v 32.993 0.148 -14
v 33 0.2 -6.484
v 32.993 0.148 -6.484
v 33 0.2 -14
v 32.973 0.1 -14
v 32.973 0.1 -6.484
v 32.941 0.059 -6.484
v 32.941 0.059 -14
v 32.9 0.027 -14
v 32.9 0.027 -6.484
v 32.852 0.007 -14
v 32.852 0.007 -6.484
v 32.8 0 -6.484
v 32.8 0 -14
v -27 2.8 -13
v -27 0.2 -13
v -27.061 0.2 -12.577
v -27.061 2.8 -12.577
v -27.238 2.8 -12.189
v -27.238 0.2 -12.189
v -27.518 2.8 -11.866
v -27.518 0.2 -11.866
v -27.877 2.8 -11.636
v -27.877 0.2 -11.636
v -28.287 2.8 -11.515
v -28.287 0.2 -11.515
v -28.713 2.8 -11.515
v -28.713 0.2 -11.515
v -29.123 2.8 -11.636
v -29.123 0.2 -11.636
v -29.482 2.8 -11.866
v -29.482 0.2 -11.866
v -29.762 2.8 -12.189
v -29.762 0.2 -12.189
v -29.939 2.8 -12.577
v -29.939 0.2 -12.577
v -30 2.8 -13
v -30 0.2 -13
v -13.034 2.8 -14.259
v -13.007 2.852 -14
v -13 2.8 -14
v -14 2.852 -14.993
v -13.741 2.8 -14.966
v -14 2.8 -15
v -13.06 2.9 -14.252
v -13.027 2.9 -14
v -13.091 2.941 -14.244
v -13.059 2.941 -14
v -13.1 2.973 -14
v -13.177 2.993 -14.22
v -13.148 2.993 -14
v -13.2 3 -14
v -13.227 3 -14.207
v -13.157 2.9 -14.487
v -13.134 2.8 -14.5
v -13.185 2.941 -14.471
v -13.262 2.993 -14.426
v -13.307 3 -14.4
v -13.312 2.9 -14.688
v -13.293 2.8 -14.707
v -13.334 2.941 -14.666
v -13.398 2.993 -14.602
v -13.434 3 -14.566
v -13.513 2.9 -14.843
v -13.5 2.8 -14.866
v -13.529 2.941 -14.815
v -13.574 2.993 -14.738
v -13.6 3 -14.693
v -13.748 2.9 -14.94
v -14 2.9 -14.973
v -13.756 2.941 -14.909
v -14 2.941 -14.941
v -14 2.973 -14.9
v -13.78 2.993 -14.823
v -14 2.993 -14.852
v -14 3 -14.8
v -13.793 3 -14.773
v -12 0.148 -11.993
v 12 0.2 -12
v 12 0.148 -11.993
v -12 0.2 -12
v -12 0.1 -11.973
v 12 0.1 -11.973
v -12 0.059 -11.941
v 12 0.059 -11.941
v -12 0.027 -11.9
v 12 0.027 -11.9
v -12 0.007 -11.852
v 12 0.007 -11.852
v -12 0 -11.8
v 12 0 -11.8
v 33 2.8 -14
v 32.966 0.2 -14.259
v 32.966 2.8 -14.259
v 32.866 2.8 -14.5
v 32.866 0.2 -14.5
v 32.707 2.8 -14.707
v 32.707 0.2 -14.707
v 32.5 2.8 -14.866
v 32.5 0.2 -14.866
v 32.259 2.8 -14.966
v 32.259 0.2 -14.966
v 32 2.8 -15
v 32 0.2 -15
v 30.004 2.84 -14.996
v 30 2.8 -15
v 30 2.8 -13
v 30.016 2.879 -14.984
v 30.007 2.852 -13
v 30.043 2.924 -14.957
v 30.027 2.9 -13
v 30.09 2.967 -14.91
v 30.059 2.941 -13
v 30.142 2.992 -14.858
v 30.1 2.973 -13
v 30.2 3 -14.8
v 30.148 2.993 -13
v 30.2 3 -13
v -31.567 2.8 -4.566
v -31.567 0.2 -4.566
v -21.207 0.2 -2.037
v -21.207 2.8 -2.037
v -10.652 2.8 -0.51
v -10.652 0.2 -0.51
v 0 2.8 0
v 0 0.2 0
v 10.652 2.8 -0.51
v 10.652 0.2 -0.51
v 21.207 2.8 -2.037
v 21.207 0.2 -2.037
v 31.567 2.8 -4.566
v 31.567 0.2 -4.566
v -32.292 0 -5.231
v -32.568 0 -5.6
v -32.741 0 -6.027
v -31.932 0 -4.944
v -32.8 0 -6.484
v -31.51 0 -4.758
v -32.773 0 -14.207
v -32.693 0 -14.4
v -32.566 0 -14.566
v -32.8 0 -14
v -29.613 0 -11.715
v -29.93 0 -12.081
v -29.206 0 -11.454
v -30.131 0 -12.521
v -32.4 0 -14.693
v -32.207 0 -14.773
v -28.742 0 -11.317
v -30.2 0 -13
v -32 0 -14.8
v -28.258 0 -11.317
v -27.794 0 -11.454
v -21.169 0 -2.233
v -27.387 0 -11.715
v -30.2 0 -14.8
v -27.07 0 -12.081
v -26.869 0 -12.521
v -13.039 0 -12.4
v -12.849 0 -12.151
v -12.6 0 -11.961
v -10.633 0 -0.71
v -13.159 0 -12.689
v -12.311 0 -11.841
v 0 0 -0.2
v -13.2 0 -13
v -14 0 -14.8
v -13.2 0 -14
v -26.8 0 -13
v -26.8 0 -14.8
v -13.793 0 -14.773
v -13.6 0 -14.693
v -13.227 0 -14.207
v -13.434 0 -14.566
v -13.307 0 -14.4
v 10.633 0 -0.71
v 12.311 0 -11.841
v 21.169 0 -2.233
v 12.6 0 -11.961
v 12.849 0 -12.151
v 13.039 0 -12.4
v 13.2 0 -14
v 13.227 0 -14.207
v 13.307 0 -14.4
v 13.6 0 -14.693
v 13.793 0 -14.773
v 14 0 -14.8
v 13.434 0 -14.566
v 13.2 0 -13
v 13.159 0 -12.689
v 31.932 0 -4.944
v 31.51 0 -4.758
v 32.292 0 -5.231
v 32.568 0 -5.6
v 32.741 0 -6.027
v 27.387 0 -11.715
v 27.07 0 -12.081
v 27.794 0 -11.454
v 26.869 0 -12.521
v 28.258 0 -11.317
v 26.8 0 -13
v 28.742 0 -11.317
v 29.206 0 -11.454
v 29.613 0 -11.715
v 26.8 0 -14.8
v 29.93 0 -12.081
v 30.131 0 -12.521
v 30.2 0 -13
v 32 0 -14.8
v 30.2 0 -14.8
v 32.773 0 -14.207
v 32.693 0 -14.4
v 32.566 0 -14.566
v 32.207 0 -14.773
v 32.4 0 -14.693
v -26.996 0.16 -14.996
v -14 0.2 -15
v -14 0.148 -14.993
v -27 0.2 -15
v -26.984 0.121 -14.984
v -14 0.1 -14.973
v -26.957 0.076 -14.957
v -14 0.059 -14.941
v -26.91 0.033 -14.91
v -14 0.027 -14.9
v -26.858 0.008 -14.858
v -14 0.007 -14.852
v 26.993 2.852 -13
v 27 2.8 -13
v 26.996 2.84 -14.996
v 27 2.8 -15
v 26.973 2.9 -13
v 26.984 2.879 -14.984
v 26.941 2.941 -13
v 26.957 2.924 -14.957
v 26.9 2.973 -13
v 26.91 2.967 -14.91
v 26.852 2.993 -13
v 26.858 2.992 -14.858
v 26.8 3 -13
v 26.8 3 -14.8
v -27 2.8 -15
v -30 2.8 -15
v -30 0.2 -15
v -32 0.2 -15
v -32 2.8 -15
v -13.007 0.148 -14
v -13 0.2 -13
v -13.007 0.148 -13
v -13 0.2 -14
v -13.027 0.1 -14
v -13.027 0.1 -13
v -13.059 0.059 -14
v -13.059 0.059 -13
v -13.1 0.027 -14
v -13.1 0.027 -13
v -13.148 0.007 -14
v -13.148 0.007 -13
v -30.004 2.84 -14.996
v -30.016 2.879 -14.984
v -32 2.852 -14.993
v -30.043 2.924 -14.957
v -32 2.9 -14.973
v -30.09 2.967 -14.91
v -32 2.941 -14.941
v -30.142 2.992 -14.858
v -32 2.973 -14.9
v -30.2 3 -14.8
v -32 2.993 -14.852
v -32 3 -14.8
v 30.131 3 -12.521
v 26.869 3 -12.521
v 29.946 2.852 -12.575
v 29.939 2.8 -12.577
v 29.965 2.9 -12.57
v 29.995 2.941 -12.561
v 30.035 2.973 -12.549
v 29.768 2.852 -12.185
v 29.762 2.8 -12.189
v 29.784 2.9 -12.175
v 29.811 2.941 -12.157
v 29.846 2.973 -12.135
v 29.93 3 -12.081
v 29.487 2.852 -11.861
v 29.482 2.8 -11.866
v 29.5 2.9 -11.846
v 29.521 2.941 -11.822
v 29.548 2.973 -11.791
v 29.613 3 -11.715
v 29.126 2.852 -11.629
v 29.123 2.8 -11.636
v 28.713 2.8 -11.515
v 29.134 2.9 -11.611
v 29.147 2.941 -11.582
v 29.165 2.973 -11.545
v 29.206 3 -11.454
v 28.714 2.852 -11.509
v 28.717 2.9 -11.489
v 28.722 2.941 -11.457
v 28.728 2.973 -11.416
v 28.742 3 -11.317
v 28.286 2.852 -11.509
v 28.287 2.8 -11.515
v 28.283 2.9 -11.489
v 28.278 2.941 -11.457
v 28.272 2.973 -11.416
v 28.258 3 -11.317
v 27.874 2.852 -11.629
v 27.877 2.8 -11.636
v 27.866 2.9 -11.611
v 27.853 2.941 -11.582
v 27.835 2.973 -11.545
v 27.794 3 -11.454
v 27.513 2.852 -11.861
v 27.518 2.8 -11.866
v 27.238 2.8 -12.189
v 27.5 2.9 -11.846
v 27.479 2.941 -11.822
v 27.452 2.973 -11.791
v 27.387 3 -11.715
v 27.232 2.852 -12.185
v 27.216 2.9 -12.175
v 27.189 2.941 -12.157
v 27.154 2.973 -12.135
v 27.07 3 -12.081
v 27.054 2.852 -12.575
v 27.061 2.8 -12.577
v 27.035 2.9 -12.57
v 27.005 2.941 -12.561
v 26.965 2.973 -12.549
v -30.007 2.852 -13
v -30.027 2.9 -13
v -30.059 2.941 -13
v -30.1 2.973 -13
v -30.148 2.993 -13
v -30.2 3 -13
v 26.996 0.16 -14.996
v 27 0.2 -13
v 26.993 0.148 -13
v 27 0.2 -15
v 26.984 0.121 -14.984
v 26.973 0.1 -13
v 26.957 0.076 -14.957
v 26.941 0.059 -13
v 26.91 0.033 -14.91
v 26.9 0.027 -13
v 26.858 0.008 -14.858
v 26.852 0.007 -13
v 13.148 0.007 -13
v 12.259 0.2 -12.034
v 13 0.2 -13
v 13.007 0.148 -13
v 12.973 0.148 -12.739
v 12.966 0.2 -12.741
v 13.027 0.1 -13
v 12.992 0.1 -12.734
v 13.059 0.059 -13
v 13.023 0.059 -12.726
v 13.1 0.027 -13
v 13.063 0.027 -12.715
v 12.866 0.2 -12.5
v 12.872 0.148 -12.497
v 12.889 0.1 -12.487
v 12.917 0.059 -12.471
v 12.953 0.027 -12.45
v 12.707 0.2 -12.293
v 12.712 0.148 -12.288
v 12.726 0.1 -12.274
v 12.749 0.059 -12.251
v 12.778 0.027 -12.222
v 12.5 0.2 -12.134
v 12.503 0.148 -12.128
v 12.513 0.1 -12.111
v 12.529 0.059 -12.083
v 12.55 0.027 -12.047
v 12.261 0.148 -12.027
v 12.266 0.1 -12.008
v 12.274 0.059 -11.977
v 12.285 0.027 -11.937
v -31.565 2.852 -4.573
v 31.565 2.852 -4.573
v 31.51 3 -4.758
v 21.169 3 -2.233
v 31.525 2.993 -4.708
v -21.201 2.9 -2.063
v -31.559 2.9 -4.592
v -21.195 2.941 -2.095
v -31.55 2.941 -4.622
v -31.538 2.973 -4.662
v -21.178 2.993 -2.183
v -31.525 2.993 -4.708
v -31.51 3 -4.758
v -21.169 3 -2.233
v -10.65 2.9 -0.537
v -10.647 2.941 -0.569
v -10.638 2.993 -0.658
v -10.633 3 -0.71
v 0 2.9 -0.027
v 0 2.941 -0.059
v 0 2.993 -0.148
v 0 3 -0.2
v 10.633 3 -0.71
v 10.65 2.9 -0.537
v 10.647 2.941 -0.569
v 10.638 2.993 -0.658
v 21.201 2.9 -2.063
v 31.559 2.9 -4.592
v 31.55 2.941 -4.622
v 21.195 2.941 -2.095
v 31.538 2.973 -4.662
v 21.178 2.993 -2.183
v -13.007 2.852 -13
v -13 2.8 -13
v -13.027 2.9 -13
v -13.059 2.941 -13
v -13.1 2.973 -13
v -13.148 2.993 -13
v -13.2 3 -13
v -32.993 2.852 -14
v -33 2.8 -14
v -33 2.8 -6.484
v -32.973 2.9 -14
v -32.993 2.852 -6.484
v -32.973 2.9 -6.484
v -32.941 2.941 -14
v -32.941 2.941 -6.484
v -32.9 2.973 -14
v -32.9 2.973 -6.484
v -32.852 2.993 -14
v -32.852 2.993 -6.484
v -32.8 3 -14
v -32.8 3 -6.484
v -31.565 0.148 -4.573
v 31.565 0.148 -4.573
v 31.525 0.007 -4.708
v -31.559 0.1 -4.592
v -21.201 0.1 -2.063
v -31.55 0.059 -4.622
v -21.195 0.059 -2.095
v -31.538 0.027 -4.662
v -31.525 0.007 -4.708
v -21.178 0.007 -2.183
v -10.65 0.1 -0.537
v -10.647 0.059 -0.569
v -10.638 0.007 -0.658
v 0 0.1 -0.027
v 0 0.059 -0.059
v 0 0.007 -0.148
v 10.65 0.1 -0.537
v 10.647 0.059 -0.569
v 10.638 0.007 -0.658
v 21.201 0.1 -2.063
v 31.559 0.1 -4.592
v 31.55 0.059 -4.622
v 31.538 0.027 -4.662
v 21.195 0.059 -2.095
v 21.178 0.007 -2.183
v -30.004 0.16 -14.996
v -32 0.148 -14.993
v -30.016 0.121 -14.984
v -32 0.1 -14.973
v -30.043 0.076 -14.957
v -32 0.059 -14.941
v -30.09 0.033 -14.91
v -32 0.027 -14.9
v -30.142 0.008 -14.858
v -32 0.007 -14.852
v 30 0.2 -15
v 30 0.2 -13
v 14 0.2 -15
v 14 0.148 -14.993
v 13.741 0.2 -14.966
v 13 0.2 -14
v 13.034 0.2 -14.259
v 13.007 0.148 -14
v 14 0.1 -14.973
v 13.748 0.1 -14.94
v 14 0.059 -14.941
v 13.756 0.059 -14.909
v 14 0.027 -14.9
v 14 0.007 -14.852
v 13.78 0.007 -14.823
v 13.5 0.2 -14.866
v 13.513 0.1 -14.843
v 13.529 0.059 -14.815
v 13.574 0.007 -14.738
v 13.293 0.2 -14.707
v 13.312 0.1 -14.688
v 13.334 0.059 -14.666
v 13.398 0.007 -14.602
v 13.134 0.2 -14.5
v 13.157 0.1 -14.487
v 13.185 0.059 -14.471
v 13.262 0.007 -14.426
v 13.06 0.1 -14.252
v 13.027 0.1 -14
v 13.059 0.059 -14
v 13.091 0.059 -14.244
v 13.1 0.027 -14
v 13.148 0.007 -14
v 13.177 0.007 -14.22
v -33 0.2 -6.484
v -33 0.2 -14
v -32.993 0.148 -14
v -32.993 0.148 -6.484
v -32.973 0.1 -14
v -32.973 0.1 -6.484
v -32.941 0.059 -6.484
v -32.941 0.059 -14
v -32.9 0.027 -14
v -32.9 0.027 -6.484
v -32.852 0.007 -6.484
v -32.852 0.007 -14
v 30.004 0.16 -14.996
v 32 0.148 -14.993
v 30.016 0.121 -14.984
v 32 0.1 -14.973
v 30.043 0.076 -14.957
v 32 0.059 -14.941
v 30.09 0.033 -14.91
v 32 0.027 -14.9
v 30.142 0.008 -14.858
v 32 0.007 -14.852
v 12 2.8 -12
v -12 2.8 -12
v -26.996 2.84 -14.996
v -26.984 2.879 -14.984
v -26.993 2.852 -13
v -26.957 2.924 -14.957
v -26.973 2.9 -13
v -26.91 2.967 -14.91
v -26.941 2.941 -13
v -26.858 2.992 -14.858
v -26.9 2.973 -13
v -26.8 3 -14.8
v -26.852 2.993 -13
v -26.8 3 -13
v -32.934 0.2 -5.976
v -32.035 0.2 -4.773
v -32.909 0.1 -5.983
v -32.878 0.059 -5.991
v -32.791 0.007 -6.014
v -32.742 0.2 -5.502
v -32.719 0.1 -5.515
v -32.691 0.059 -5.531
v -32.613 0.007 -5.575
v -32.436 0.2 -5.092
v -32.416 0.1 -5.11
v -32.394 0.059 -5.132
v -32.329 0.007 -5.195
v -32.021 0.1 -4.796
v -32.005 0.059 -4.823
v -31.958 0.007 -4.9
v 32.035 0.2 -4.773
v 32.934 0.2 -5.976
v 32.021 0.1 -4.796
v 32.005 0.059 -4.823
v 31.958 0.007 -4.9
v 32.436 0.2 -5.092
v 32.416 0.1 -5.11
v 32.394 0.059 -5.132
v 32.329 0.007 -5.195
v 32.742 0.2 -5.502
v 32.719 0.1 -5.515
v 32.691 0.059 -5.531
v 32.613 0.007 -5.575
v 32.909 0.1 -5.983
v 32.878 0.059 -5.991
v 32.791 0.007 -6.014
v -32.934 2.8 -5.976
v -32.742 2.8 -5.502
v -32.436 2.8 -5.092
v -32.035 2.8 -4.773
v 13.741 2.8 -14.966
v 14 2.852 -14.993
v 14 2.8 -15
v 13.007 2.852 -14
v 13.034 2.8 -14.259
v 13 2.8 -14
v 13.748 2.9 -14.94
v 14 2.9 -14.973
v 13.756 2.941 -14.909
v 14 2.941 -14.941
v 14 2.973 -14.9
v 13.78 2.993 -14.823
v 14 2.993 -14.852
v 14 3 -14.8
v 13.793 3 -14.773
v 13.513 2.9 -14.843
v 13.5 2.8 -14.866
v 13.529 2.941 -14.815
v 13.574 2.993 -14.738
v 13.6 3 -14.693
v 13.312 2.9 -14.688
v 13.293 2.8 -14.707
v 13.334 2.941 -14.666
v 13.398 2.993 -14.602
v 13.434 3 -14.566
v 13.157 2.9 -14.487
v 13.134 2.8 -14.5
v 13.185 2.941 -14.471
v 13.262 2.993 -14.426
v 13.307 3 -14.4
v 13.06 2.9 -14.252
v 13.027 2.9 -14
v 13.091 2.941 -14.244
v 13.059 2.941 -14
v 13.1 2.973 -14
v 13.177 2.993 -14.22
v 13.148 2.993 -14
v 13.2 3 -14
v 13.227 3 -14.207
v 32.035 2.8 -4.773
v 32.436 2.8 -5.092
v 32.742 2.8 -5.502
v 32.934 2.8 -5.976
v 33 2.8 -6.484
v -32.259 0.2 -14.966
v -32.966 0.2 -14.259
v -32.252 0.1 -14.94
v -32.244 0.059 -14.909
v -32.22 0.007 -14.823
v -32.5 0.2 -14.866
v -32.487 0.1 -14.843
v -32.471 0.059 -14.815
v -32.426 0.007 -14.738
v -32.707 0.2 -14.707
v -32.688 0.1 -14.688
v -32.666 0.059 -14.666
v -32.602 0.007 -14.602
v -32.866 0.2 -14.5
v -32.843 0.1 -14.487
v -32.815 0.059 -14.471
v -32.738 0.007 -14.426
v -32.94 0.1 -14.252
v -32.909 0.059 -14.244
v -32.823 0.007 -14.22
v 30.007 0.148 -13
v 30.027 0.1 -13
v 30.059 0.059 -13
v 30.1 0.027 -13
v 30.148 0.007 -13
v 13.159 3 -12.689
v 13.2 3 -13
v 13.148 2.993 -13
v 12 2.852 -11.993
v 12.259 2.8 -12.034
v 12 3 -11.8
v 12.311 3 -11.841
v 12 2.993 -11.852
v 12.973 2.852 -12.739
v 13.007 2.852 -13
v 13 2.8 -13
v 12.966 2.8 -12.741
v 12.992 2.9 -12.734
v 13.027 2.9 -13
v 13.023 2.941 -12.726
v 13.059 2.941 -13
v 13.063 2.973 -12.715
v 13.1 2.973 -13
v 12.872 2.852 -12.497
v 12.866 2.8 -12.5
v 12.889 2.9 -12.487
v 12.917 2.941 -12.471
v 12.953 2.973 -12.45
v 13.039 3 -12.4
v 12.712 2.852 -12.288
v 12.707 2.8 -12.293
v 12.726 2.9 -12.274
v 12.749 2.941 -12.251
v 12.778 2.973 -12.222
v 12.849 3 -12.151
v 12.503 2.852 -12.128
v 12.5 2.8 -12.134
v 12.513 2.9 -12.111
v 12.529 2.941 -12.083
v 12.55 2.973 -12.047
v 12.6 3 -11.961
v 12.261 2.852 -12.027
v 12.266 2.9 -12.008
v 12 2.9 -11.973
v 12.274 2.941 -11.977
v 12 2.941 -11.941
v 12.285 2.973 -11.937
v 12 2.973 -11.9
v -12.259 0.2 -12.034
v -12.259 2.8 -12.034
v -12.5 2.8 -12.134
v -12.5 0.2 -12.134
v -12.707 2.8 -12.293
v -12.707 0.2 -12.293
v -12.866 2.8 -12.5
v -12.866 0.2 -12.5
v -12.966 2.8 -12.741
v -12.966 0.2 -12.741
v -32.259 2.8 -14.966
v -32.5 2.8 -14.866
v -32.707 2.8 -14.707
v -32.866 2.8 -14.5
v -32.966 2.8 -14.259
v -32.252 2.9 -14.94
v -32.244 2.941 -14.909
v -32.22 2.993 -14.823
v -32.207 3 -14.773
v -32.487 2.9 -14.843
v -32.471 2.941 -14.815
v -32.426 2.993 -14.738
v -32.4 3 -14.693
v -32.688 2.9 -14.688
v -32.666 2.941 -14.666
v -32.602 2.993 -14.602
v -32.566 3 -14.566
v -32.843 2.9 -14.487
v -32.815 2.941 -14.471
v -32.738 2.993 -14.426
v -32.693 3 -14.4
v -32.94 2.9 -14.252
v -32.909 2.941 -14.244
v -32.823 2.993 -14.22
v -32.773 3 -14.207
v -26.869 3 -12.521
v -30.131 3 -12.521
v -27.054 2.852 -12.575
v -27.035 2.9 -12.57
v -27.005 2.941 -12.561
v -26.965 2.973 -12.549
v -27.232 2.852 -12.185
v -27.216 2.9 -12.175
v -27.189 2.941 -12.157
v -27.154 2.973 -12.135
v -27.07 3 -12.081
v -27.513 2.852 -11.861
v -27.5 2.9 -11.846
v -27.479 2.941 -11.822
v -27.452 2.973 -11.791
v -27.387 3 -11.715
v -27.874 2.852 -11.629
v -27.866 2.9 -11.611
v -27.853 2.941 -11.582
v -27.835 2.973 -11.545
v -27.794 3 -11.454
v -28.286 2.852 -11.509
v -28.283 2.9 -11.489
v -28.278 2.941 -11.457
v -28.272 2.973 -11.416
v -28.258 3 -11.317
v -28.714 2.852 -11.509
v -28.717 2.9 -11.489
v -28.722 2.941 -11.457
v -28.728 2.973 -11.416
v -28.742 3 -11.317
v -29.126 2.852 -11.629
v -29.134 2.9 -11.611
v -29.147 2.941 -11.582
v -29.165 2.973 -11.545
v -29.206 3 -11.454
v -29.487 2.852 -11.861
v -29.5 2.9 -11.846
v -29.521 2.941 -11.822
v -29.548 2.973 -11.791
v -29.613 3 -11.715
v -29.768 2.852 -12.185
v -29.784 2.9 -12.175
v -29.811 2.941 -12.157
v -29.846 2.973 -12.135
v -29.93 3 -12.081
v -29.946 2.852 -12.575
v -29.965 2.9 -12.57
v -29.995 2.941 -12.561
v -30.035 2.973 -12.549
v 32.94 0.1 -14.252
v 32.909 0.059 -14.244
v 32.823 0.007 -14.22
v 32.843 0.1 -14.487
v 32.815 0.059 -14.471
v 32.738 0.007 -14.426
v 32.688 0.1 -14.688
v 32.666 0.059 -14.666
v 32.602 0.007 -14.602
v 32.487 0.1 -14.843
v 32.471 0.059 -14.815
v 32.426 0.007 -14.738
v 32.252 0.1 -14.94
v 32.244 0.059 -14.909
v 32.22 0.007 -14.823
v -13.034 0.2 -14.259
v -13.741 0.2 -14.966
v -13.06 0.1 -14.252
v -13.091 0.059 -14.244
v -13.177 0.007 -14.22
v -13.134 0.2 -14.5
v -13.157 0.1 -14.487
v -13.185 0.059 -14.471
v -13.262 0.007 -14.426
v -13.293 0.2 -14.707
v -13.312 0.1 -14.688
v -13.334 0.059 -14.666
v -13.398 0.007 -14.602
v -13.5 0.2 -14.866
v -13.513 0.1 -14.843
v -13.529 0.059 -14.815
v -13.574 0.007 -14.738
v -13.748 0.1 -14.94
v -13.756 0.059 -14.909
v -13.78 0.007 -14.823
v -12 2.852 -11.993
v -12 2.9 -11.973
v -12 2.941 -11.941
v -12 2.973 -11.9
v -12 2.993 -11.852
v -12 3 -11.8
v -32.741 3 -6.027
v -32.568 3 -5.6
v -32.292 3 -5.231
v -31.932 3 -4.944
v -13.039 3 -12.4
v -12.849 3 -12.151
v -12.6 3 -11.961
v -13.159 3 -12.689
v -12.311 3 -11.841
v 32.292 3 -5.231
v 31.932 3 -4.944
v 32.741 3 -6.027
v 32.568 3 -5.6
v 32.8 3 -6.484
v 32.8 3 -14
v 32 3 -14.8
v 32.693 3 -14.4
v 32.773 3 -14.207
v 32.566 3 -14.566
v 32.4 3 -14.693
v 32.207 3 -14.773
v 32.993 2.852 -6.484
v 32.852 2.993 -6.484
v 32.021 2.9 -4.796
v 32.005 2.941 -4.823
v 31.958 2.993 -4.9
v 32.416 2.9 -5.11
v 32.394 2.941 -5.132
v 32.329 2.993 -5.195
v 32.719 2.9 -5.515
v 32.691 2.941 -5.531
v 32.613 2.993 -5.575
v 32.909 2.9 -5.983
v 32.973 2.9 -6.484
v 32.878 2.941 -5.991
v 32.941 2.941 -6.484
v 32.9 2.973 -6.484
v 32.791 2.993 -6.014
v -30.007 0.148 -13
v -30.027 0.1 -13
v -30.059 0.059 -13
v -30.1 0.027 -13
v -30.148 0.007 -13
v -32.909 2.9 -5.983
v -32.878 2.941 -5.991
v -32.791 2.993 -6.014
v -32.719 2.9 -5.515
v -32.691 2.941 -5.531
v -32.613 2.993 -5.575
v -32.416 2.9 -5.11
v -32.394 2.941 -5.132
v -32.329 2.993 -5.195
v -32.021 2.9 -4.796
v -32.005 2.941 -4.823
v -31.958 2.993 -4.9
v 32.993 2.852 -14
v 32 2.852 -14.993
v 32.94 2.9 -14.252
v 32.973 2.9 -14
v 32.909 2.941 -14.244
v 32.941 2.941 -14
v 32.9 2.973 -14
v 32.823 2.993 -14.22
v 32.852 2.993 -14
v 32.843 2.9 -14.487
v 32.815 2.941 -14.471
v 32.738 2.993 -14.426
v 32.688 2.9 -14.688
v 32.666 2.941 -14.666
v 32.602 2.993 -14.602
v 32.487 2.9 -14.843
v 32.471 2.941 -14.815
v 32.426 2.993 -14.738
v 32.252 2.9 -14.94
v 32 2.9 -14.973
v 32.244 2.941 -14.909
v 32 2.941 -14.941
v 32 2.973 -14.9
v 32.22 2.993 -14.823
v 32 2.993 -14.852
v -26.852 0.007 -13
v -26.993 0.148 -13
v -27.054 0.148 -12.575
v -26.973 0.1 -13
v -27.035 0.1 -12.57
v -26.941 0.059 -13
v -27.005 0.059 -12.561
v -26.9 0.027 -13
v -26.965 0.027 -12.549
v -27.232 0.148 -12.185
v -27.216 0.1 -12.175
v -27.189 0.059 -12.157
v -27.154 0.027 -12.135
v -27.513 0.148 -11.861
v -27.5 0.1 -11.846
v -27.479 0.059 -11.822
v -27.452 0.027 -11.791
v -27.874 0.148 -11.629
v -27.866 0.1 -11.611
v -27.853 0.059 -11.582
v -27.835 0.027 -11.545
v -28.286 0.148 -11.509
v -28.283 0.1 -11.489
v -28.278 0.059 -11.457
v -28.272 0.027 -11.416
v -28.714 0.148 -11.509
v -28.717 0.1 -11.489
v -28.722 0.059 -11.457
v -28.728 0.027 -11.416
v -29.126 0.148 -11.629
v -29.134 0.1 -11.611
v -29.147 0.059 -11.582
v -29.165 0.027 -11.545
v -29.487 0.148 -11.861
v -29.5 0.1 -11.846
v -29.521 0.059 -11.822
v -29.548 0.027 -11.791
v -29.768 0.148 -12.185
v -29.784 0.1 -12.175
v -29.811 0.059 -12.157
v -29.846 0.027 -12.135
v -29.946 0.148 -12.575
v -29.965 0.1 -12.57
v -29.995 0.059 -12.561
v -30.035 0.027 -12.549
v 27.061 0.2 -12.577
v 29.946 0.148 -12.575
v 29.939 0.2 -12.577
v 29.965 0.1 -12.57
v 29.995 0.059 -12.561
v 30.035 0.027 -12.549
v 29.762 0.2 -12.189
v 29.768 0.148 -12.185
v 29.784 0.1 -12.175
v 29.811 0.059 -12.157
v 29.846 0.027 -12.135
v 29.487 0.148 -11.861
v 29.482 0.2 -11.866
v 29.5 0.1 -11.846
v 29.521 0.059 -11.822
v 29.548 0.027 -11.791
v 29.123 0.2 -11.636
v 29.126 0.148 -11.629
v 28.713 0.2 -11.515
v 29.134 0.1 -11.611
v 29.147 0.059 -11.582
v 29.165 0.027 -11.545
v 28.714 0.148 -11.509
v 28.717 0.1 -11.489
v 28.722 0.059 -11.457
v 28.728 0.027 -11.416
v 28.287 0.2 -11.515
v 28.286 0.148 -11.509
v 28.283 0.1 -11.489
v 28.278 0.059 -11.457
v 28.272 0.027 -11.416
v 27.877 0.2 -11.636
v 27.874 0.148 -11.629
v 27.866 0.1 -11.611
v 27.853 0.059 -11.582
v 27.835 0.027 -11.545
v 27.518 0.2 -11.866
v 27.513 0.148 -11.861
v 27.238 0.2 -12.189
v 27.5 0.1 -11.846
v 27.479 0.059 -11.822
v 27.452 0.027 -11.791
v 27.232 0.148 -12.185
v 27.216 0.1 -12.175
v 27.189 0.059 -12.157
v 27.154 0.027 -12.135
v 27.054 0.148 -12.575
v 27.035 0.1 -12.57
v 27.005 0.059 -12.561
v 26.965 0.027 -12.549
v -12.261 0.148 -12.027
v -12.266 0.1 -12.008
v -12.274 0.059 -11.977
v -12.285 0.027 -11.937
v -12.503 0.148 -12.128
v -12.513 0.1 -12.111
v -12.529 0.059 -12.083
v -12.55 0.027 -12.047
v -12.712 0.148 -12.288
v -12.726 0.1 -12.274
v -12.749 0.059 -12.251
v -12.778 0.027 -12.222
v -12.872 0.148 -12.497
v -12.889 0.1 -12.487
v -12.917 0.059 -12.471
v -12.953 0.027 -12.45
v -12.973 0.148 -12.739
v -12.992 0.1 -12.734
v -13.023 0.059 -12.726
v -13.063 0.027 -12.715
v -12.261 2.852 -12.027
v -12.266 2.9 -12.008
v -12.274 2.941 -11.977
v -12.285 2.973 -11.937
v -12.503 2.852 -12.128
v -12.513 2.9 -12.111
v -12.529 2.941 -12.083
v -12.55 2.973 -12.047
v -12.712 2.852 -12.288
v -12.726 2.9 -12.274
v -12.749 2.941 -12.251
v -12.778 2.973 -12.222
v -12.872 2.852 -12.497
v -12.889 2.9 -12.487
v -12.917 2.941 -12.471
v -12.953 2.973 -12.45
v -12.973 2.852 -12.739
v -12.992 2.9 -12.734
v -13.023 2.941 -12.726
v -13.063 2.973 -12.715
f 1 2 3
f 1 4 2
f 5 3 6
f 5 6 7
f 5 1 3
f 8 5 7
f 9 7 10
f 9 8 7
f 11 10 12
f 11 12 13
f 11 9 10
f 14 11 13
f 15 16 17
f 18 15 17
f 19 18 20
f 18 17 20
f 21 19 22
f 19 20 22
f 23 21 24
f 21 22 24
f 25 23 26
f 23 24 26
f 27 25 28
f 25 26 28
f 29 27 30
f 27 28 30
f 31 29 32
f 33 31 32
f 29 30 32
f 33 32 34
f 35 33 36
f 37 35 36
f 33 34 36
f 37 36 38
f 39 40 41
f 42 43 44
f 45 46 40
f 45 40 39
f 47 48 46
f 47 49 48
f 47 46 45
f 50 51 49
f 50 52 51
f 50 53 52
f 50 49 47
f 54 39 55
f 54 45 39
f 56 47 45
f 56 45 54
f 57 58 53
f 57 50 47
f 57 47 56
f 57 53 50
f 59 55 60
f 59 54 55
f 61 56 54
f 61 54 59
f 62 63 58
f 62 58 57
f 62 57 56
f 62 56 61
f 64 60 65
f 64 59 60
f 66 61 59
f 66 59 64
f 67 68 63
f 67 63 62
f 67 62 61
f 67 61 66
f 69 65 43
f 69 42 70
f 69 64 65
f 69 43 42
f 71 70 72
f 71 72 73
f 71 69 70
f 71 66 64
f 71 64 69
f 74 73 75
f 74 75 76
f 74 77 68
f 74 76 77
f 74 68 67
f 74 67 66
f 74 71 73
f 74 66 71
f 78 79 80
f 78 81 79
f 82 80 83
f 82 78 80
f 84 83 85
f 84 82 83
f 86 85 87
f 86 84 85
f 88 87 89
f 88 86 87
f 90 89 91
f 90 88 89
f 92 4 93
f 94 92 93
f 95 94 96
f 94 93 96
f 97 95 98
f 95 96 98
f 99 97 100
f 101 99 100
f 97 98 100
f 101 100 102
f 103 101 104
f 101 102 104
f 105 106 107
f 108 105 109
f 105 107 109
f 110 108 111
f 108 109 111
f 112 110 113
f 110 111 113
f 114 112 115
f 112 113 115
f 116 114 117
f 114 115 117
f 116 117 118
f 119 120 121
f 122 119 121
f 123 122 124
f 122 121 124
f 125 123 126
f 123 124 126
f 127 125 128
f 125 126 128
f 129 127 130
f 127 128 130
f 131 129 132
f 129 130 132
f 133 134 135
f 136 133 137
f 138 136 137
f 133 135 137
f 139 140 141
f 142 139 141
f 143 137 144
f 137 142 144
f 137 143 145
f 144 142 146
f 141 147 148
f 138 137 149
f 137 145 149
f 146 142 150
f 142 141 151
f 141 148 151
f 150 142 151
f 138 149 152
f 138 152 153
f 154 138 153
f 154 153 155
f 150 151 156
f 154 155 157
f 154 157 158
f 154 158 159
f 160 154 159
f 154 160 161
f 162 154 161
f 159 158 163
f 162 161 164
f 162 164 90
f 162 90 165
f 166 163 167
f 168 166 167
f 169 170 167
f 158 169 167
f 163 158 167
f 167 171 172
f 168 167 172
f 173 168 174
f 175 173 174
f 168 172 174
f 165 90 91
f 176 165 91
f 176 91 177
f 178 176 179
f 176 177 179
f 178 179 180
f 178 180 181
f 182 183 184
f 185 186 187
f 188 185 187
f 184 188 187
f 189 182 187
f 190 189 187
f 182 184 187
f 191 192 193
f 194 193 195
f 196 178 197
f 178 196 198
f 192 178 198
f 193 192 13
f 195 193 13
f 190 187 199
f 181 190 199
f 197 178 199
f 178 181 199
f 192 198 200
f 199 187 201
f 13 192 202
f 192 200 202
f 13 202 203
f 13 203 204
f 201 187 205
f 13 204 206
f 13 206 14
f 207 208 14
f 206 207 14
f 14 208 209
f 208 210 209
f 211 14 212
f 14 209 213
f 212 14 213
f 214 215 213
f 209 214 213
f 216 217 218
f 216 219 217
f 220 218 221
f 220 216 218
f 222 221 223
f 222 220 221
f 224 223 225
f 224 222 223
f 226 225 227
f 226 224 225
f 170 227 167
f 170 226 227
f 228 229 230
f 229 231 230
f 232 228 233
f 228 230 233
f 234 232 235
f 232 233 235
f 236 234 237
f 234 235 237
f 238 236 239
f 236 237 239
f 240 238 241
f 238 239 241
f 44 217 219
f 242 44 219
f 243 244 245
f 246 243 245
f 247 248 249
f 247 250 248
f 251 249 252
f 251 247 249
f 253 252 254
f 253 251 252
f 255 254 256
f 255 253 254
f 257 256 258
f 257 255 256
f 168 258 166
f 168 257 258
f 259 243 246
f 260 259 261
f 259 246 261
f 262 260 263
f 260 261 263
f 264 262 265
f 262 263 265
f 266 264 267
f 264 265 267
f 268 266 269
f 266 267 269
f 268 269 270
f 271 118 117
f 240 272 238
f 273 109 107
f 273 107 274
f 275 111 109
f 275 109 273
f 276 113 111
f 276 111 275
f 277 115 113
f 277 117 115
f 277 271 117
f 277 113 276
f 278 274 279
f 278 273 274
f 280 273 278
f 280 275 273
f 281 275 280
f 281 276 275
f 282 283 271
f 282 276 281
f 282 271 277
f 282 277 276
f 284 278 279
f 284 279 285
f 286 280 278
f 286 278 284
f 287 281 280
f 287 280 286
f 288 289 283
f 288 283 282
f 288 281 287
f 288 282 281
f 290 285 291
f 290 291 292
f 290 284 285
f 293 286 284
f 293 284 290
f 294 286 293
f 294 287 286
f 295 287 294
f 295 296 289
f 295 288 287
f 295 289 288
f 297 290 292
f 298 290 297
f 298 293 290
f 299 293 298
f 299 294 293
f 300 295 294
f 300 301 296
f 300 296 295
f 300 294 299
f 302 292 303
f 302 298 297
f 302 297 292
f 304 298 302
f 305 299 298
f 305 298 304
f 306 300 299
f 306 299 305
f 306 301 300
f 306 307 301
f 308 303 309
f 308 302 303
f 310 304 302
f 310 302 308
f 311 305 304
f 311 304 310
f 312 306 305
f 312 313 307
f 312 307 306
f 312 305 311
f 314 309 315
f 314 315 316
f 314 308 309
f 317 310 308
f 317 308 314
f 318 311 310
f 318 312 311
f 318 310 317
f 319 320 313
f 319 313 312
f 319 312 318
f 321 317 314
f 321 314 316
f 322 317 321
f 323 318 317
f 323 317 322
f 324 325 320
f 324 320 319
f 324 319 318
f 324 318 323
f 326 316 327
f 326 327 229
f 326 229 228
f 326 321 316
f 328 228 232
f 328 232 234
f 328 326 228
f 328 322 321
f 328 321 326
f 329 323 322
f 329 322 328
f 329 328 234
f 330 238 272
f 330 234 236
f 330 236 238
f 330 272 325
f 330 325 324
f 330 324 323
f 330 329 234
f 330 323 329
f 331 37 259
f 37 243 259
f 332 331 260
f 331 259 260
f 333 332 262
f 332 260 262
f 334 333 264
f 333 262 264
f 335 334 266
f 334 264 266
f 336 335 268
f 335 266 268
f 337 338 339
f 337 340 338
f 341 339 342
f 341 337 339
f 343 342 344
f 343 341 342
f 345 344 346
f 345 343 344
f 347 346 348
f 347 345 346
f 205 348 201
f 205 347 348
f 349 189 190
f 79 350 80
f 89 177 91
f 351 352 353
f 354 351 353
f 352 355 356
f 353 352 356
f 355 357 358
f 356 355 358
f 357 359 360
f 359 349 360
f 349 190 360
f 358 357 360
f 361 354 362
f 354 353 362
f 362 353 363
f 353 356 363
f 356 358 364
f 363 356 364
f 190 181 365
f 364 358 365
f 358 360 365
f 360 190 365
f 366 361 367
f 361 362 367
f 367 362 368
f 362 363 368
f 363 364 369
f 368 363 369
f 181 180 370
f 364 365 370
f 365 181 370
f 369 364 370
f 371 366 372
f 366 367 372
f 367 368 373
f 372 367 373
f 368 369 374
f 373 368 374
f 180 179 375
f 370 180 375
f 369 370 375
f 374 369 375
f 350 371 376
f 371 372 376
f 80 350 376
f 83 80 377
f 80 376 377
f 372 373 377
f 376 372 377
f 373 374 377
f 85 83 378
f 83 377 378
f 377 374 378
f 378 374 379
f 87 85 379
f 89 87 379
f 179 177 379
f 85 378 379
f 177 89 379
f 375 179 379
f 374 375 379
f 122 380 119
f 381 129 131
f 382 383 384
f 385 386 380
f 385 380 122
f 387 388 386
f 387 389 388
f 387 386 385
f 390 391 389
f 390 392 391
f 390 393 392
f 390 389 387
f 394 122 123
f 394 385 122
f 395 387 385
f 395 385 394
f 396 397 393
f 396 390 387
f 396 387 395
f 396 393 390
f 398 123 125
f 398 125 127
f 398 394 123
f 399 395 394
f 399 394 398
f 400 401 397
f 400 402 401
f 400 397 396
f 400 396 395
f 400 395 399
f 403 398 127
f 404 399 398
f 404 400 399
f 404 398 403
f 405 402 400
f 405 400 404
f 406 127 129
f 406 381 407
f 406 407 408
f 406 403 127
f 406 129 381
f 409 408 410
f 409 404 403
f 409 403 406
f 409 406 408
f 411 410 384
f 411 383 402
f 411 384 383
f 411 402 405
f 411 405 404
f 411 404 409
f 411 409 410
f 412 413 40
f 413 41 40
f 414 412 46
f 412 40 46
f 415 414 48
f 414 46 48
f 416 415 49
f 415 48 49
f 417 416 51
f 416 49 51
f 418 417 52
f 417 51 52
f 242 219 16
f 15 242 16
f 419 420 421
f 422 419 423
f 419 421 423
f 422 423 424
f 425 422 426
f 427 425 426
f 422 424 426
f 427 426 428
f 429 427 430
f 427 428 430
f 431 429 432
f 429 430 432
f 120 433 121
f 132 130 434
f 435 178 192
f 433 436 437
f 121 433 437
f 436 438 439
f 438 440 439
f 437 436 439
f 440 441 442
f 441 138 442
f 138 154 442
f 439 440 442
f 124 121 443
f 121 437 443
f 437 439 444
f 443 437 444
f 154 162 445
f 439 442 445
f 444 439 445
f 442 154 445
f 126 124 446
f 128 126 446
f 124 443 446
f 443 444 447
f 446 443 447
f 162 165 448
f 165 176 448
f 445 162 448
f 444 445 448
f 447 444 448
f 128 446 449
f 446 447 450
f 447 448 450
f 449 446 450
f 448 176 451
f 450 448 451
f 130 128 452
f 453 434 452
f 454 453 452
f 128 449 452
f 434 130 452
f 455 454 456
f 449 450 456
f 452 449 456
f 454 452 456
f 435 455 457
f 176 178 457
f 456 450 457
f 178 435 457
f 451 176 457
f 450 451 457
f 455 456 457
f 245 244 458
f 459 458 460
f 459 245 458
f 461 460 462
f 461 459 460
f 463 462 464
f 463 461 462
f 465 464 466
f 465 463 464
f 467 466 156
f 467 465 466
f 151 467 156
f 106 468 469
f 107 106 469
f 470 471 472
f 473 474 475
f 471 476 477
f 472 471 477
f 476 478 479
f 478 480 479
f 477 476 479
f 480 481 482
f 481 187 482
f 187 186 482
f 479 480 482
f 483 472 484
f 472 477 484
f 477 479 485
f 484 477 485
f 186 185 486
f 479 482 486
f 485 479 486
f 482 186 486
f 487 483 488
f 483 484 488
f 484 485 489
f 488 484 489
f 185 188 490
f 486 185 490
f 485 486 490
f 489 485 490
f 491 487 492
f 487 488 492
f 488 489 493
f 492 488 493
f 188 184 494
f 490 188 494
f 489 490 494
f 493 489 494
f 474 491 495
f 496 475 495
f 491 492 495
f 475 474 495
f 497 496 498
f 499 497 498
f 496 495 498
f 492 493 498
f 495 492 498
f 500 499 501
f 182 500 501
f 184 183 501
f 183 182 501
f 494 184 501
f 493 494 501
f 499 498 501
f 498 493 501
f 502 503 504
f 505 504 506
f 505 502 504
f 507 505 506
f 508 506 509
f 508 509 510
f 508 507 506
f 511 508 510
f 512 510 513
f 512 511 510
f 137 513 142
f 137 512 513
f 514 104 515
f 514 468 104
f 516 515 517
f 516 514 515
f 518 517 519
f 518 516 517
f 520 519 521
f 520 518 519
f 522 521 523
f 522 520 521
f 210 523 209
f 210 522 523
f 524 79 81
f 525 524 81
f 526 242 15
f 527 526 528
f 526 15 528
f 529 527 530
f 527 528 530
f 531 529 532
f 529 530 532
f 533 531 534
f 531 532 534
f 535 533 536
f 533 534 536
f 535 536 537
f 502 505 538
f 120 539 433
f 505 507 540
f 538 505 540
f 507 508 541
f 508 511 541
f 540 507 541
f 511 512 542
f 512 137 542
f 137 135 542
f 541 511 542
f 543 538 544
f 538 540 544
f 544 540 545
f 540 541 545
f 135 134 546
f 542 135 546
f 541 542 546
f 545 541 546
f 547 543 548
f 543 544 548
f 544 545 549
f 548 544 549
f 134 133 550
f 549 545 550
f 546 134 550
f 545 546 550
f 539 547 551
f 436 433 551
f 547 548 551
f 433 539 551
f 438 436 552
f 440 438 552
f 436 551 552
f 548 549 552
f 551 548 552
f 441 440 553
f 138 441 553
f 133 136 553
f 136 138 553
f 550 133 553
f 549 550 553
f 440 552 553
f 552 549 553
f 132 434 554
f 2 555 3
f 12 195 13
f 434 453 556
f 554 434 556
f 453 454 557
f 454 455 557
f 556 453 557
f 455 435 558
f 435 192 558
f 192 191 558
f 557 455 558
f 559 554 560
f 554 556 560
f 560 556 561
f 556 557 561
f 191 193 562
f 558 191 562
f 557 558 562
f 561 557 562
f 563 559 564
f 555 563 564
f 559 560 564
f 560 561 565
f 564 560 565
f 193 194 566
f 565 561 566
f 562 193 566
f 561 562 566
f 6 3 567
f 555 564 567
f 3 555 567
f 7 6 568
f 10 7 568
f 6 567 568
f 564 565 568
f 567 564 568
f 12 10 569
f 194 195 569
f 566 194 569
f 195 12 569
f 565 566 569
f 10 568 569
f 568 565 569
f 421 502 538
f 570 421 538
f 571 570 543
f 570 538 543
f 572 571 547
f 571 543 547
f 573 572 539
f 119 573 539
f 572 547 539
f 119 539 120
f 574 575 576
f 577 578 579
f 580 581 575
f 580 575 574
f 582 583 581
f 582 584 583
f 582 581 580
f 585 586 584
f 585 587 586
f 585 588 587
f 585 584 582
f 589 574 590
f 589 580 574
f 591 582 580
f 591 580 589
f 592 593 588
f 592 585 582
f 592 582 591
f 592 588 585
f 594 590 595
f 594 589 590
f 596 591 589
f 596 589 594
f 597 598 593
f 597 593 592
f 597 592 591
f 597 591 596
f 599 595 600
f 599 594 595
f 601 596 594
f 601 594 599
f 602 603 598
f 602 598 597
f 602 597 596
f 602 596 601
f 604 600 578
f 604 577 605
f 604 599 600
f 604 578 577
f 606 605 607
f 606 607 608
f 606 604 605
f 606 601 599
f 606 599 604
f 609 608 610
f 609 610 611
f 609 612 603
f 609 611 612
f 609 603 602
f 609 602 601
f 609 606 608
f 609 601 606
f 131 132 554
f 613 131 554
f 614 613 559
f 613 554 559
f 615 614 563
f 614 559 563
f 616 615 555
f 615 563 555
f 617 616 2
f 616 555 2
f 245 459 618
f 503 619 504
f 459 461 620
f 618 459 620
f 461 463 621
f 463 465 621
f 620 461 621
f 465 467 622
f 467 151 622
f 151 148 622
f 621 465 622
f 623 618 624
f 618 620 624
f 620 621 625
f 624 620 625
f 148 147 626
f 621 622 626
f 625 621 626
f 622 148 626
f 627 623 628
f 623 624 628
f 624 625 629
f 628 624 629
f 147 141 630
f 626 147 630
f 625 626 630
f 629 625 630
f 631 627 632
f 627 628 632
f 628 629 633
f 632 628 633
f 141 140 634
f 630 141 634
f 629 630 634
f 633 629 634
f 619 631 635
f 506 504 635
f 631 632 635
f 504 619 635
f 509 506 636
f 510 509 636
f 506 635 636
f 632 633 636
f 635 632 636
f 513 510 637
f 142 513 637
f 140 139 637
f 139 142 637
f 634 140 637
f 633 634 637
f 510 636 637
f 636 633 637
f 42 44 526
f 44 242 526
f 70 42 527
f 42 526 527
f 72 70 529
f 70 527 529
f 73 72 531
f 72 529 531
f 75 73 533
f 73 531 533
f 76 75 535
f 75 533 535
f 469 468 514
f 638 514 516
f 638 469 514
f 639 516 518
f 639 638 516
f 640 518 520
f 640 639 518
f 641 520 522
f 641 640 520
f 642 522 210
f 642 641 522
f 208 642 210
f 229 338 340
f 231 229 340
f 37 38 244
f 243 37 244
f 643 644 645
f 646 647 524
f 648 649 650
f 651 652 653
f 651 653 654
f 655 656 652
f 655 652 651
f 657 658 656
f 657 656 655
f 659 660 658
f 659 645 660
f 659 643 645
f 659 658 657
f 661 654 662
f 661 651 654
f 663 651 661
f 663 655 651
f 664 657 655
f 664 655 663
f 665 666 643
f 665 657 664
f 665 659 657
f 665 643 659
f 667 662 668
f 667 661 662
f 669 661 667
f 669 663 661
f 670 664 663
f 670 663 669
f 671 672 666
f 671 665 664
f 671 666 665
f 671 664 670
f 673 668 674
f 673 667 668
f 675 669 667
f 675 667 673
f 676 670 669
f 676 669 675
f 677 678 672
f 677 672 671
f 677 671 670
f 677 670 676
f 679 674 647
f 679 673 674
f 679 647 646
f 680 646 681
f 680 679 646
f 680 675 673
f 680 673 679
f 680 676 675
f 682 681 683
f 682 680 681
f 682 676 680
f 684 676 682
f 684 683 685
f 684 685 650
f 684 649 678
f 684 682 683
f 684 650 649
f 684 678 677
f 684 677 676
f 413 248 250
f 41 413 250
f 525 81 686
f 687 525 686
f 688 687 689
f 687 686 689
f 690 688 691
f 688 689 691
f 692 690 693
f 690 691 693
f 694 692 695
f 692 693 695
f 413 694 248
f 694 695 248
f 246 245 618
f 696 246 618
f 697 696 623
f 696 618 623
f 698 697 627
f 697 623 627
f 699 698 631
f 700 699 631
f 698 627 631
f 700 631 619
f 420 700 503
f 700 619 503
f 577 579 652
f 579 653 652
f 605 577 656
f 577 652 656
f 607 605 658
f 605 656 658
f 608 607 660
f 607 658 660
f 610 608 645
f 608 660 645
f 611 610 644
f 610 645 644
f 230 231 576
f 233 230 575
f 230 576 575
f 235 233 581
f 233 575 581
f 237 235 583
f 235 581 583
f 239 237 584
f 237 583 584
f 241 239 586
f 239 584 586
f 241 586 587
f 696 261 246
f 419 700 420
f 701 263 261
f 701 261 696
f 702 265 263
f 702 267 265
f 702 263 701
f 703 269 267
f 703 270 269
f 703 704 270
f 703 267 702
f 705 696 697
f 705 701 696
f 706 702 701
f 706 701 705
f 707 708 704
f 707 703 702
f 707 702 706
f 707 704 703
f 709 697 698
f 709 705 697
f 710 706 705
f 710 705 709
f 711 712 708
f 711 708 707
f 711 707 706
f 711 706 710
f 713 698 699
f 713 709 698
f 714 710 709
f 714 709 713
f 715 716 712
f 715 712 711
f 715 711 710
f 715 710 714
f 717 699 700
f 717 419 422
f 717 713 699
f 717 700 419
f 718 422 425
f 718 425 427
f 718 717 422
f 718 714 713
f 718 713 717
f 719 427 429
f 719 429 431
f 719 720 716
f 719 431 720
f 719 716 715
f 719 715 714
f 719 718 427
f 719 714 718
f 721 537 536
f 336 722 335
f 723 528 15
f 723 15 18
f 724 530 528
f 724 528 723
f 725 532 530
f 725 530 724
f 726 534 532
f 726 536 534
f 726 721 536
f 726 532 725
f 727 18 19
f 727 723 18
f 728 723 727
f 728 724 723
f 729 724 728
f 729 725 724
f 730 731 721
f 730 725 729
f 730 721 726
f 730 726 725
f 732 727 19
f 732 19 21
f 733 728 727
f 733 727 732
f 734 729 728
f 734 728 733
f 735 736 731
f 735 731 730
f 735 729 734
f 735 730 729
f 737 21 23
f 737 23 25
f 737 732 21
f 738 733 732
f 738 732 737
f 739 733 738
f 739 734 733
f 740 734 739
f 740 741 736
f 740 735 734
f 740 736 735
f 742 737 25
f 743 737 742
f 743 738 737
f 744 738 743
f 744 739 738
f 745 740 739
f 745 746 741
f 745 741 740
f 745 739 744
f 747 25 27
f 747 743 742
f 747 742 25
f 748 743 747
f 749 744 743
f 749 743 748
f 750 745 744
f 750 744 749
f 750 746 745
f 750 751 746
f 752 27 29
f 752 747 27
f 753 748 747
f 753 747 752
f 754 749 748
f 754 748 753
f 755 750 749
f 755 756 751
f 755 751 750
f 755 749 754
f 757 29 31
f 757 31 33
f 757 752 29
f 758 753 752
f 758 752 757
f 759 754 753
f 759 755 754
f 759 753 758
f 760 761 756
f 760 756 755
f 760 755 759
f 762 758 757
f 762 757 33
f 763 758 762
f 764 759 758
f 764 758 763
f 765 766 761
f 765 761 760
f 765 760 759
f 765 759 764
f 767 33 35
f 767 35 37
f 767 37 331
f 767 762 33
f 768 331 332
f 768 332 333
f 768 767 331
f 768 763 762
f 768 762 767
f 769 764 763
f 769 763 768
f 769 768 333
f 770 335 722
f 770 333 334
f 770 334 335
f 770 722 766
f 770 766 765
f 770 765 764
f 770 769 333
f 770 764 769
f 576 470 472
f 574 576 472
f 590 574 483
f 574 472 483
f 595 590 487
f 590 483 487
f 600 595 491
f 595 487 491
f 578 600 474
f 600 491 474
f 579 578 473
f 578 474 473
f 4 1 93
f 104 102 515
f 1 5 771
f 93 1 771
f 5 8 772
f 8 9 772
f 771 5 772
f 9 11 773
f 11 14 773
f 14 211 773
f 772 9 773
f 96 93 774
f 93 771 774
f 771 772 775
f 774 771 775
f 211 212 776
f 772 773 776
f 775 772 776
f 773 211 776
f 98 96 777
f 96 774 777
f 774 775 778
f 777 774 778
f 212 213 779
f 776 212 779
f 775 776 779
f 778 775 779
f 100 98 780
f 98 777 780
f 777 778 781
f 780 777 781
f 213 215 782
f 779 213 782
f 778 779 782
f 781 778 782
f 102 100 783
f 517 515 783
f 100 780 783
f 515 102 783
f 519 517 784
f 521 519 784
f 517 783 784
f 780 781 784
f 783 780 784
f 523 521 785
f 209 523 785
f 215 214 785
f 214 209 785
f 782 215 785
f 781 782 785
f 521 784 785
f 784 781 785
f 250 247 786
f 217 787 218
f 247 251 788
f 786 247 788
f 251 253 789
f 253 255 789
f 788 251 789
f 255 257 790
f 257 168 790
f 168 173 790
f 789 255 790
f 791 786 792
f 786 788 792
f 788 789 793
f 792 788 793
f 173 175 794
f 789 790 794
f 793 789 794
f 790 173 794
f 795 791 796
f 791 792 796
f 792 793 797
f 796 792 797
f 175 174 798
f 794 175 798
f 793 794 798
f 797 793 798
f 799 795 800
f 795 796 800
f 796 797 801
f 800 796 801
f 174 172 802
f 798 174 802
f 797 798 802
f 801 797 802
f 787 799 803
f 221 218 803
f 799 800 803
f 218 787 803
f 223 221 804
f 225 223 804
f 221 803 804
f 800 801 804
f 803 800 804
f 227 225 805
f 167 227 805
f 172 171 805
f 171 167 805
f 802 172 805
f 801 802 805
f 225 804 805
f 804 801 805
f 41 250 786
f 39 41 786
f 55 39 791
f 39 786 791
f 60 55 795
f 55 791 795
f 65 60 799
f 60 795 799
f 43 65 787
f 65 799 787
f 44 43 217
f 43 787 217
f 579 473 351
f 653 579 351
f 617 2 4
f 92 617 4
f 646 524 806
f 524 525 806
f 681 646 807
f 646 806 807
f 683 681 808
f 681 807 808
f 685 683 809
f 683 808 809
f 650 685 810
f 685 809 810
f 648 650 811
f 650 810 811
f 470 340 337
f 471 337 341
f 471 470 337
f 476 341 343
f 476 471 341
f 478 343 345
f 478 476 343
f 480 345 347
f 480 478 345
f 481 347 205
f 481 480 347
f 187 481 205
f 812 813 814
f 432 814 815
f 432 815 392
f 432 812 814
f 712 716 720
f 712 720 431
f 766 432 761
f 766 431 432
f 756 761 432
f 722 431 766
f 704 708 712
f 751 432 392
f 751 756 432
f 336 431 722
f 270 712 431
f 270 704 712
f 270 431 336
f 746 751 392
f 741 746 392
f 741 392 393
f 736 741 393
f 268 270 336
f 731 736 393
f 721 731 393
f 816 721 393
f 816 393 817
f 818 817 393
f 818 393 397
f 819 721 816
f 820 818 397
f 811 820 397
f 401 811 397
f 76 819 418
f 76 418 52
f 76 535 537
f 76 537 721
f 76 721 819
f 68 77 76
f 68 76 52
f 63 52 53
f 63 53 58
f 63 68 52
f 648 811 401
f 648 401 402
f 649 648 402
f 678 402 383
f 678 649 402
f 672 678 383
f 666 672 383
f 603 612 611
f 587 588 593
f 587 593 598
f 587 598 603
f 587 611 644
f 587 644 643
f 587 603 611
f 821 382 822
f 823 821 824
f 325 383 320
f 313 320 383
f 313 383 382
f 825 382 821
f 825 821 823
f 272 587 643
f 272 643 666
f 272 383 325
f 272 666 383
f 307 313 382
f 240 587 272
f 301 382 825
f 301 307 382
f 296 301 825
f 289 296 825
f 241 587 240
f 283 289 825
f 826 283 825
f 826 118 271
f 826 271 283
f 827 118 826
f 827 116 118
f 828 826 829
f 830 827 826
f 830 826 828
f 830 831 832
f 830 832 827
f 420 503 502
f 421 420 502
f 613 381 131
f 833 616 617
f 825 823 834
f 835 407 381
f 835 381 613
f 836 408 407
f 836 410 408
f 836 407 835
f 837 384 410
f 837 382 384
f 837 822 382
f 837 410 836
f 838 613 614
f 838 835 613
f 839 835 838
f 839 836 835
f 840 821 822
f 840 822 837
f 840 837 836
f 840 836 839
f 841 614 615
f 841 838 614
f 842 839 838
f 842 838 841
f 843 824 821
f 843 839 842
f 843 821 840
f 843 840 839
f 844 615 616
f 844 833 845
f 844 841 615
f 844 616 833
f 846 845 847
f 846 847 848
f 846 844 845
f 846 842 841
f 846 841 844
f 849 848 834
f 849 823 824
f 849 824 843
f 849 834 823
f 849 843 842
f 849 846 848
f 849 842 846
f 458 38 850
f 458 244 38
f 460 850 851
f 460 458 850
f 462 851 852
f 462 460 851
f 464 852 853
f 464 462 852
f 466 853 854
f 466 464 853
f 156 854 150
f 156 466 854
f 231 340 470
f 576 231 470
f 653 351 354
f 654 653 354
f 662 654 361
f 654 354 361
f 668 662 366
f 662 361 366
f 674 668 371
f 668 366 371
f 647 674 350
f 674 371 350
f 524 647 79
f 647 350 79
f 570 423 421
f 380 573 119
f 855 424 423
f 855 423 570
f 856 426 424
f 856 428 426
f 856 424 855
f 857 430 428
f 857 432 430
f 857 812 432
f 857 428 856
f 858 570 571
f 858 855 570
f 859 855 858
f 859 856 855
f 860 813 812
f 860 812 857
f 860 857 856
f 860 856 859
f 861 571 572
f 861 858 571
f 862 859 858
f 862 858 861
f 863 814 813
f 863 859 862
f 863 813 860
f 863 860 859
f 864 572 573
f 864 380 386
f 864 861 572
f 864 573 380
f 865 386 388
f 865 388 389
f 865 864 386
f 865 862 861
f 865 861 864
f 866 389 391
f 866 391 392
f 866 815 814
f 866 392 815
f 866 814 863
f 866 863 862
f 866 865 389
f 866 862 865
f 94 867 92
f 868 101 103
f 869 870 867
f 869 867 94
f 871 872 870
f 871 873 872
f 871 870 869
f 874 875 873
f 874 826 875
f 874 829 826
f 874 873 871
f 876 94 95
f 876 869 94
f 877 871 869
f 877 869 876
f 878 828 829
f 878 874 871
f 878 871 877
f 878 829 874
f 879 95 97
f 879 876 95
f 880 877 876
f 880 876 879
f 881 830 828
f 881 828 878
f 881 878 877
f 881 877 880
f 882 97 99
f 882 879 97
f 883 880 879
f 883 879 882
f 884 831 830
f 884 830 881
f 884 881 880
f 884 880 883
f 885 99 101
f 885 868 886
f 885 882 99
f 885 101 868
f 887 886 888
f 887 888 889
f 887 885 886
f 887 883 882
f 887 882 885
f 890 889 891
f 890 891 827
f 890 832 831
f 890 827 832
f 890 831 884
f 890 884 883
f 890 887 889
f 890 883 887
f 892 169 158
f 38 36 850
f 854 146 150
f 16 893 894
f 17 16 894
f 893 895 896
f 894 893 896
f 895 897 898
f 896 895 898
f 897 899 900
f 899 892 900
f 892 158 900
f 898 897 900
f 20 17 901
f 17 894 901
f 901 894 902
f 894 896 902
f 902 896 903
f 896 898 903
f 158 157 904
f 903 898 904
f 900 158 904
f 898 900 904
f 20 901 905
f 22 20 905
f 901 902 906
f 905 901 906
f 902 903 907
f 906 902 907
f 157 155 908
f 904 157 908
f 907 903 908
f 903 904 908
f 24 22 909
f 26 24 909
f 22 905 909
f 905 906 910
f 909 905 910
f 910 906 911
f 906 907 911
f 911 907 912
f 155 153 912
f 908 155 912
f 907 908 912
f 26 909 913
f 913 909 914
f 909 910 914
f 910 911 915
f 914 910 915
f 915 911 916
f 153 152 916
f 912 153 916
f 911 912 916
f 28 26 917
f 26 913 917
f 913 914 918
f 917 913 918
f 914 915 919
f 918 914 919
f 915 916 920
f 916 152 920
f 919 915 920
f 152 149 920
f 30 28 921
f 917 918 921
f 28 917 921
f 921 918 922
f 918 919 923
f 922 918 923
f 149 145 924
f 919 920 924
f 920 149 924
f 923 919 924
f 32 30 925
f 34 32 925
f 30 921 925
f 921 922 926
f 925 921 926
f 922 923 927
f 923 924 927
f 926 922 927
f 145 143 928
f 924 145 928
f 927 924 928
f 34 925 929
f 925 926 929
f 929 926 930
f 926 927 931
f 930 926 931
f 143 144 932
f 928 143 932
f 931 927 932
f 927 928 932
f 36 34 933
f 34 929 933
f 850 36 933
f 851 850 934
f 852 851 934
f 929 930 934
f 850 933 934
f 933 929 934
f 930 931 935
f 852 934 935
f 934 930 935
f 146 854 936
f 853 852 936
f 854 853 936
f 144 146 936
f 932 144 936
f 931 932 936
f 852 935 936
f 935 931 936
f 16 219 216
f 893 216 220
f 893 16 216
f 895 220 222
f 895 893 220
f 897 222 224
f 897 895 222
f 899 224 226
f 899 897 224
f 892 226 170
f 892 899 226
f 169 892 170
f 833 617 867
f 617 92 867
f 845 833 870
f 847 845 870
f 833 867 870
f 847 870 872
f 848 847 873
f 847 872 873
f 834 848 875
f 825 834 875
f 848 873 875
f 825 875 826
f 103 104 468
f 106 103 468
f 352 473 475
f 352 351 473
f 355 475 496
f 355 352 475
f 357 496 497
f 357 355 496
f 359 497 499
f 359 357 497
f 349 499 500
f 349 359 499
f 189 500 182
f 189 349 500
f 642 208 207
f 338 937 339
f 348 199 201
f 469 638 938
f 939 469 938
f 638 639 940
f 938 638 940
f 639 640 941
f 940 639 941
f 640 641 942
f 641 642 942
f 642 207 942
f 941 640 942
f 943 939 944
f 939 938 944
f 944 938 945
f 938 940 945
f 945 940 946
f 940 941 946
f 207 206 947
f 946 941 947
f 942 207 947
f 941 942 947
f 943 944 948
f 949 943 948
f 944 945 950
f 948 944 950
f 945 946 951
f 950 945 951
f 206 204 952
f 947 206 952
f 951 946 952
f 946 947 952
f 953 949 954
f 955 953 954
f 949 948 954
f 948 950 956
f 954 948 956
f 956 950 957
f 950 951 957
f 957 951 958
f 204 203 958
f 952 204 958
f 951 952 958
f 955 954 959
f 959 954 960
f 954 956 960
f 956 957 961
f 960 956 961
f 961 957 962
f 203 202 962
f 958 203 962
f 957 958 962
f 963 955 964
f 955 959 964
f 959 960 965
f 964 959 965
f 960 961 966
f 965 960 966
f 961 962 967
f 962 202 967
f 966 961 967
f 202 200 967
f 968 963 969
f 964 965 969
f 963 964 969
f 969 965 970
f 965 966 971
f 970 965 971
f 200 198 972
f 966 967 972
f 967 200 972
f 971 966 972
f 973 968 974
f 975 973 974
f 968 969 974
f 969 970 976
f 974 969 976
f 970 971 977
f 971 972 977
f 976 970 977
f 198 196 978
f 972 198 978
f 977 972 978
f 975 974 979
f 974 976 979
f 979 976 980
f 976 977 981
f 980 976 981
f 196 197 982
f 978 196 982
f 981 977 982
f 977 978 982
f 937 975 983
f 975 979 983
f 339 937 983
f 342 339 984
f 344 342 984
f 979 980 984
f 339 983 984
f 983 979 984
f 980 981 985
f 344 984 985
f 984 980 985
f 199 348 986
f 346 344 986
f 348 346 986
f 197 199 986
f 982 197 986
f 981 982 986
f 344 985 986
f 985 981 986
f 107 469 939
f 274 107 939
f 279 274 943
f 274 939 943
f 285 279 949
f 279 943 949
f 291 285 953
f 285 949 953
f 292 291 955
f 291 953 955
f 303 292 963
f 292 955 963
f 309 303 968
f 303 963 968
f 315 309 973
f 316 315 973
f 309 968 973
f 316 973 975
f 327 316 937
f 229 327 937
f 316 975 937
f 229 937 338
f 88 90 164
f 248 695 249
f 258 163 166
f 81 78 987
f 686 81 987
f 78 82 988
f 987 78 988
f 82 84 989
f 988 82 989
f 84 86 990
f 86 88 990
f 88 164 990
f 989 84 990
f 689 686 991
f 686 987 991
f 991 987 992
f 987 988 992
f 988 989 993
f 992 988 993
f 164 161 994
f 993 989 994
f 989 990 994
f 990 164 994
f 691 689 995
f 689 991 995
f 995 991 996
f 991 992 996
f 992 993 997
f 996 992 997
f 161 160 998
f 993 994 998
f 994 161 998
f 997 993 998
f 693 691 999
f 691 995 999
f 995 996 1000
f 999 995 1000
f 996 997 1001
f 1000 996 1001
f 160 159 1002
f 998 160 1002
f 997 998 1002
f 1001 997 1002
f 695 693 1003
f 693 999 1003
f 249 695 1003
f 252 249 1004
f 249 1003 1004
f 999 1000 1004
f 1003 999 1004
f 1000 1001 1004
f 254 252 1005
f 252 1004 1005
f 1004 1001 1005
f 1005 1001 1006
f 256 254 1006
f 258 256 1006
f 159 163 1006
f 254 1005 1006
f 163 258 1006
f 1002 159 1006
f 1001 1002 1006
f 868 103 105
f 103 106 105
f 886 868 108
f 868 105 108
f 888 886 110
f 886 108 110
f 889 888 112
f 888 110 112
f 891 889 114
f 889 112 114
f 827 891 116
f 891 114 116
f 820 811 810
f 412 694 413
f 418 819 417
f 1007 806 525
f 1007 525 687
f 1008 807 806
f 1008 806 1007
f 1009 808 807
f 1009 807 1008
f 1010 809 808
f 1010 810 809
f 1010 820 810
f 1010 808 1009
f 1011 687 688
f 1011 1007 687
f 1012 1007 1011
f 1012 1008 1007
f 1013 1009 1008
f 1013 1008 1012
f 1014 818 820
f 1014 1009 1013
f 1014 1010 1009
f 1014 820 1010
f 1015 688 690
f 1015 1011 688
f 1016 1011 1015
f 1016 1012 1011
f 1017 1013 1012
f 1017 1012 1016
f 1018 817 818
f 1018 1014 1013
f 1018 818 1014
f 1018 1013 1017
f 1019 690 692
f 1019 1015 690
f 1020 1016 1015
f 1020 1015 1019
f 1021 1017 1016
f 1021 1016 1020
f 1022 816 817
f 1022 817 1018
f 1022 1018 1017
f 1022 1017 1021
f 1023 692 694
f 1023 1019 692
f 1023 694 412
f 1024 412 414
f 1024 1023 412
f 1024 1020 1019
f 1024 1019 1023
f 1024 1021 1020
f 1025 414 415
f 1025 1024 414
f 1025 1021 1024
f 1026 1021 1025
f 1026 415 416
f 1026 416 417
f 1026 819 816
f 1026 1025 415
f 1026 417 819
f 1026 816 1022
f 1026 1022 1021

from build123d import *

# Parameters (mm, degrees)
BOSS_EXTRUDE1_DEPTH = 3
FILLET1_R           = 0.2


with BuildPart() as part:
    # Sketch1 → Boss-Extrude1 (new body)
    with BuildSketch(Plane(origin=(0, 0, 0), x_dir=(1, 0, 0), z_dir=(0, 1, 0))):
        with BuildLine():
            Line((-33, 14), (-33, 6.484033627))
            ThreePointArc((-33, 6.484033627), (-32.602100997, 5.286840077), (-31.566727605, 4.566008648))
            ThreePointArc((-31.566727605, 4.566008648), (0, 0), (31.566727605, 4.566008648))
            ThreePointArc((31.566727605, 4.566008648), (32.602100997, 5.286840077), (33, 6.484033627))
            Line((33, 6.484033627), (33, 14))
            ThreePointArc((33, 14), (32.707106781, 14.707106781), (32, 15))
            Line((32, 15), (30, 15))
            Line((30, 15), (30, 13))
            ThreePointArc((30, 13), (28.5, 11.5), (27, 13))
            Line((27, 13), (27, 15))
            Line((27, 15), (14, 15))
            ThreePointArc((14, 15), (13.292893219, 14.707106781), (13, 14))
            Line((13, 14), (13, 13))
            ThreePointArc((13, 13), (12.707106781, 12.292893219), (12, 12))
            Line((12, 12), (-12, 12))
            ThreePointArc((-12, 12), (-12.707106781, 12.292893219), (-13, 13))
            Line((-13, 13), (-13, 14))
            ThreePointArc((-13, 14), (-13.292893219, 14.707106781), (-14, 15))
            Line((-14, 15), (-27, 15))
            Line((-27, 15), (-27, 13))
            ThreePointArc((-27, 13), (-28.5, 11.5), (-30, 13))
            Line((-30, 13), (-30, 15))
            Line((-30, 15), (-32, 15))
            ThreePointArc((-32, 15), (-32.707106781, 14.707106781), (-33, 14))
        make_face()
    extrude(amount=BOSS_EXTRUDE1_DEPTH)

    # Fillet1
    fillet1_edges = [part.edges().sort_by_distance(p)[0] for p in [
        (-13.292893219, 3, -14.707106781),
        (-20.5, 3, -15),
        (-27, 3, -14),
        (-28.5, 3, -11.5),
        (0, 0, -12),
        (12.707106781, 0, -12.292893219),
        (13, 0, -13.5),
        (13.292893219, 0, -14.707106781),
        (-30, 3, -14),
        (20.5, 0, -15),
        (27, 0, -14),
        (28.5, 0, -11.5),
        (30, 0, -14),
        (31, 0, -15),
        (32.707106781, 0, -14.707106781),
        (33, 0, -10.242016813),
        (32.602100997, 0, -5.286840077),
        (-31, 3, -15),
        (0, 0, 0),
        (-32.602100997, 0, -5.286840077),
        (-33, 0, -10.242016813),
        (-32.707106781, 0, -14.707106781),
        (-31, 0, -15),
        (-30, 0, -14),
        (-28.5, 0, -11.5),
        (-32.707106781, 3, -14.707106781),
        (-27, 0, -14),
        (-20.5, 0, -15),
        (-13.292893219, 0, -14.707106781),
        (-13, 0, -13.5),
        (-12.707106781, 0, -12.292893219),
        (-33, 3, -10.242016813),
        (-32.602100997, 3, -5.286840077),
        (0, 3, 0),
        (-12.707106781, 3, -12.292893219),
        (32.602100997, 3, -5.286840077),
        (33, 3, -10.242016813),
        (32.707106781, 3, -14.707106781),
        (31, 3, -15),
        (30, 3, -14),
        (28.5, 3, -11.5),
        (27, 3, -14),
        (20.5, 3, -15),
        (13.292893219, 3, -14.707106781),
        (13, 3, -13.5),
        (-13, 3, -13.5),
        (12.707106781, 3, -12.292893219),
        (0, 3, -12),
    ]]
    fillet(fillet1_edges, radius=FILLET1_R)


solid = part.part
